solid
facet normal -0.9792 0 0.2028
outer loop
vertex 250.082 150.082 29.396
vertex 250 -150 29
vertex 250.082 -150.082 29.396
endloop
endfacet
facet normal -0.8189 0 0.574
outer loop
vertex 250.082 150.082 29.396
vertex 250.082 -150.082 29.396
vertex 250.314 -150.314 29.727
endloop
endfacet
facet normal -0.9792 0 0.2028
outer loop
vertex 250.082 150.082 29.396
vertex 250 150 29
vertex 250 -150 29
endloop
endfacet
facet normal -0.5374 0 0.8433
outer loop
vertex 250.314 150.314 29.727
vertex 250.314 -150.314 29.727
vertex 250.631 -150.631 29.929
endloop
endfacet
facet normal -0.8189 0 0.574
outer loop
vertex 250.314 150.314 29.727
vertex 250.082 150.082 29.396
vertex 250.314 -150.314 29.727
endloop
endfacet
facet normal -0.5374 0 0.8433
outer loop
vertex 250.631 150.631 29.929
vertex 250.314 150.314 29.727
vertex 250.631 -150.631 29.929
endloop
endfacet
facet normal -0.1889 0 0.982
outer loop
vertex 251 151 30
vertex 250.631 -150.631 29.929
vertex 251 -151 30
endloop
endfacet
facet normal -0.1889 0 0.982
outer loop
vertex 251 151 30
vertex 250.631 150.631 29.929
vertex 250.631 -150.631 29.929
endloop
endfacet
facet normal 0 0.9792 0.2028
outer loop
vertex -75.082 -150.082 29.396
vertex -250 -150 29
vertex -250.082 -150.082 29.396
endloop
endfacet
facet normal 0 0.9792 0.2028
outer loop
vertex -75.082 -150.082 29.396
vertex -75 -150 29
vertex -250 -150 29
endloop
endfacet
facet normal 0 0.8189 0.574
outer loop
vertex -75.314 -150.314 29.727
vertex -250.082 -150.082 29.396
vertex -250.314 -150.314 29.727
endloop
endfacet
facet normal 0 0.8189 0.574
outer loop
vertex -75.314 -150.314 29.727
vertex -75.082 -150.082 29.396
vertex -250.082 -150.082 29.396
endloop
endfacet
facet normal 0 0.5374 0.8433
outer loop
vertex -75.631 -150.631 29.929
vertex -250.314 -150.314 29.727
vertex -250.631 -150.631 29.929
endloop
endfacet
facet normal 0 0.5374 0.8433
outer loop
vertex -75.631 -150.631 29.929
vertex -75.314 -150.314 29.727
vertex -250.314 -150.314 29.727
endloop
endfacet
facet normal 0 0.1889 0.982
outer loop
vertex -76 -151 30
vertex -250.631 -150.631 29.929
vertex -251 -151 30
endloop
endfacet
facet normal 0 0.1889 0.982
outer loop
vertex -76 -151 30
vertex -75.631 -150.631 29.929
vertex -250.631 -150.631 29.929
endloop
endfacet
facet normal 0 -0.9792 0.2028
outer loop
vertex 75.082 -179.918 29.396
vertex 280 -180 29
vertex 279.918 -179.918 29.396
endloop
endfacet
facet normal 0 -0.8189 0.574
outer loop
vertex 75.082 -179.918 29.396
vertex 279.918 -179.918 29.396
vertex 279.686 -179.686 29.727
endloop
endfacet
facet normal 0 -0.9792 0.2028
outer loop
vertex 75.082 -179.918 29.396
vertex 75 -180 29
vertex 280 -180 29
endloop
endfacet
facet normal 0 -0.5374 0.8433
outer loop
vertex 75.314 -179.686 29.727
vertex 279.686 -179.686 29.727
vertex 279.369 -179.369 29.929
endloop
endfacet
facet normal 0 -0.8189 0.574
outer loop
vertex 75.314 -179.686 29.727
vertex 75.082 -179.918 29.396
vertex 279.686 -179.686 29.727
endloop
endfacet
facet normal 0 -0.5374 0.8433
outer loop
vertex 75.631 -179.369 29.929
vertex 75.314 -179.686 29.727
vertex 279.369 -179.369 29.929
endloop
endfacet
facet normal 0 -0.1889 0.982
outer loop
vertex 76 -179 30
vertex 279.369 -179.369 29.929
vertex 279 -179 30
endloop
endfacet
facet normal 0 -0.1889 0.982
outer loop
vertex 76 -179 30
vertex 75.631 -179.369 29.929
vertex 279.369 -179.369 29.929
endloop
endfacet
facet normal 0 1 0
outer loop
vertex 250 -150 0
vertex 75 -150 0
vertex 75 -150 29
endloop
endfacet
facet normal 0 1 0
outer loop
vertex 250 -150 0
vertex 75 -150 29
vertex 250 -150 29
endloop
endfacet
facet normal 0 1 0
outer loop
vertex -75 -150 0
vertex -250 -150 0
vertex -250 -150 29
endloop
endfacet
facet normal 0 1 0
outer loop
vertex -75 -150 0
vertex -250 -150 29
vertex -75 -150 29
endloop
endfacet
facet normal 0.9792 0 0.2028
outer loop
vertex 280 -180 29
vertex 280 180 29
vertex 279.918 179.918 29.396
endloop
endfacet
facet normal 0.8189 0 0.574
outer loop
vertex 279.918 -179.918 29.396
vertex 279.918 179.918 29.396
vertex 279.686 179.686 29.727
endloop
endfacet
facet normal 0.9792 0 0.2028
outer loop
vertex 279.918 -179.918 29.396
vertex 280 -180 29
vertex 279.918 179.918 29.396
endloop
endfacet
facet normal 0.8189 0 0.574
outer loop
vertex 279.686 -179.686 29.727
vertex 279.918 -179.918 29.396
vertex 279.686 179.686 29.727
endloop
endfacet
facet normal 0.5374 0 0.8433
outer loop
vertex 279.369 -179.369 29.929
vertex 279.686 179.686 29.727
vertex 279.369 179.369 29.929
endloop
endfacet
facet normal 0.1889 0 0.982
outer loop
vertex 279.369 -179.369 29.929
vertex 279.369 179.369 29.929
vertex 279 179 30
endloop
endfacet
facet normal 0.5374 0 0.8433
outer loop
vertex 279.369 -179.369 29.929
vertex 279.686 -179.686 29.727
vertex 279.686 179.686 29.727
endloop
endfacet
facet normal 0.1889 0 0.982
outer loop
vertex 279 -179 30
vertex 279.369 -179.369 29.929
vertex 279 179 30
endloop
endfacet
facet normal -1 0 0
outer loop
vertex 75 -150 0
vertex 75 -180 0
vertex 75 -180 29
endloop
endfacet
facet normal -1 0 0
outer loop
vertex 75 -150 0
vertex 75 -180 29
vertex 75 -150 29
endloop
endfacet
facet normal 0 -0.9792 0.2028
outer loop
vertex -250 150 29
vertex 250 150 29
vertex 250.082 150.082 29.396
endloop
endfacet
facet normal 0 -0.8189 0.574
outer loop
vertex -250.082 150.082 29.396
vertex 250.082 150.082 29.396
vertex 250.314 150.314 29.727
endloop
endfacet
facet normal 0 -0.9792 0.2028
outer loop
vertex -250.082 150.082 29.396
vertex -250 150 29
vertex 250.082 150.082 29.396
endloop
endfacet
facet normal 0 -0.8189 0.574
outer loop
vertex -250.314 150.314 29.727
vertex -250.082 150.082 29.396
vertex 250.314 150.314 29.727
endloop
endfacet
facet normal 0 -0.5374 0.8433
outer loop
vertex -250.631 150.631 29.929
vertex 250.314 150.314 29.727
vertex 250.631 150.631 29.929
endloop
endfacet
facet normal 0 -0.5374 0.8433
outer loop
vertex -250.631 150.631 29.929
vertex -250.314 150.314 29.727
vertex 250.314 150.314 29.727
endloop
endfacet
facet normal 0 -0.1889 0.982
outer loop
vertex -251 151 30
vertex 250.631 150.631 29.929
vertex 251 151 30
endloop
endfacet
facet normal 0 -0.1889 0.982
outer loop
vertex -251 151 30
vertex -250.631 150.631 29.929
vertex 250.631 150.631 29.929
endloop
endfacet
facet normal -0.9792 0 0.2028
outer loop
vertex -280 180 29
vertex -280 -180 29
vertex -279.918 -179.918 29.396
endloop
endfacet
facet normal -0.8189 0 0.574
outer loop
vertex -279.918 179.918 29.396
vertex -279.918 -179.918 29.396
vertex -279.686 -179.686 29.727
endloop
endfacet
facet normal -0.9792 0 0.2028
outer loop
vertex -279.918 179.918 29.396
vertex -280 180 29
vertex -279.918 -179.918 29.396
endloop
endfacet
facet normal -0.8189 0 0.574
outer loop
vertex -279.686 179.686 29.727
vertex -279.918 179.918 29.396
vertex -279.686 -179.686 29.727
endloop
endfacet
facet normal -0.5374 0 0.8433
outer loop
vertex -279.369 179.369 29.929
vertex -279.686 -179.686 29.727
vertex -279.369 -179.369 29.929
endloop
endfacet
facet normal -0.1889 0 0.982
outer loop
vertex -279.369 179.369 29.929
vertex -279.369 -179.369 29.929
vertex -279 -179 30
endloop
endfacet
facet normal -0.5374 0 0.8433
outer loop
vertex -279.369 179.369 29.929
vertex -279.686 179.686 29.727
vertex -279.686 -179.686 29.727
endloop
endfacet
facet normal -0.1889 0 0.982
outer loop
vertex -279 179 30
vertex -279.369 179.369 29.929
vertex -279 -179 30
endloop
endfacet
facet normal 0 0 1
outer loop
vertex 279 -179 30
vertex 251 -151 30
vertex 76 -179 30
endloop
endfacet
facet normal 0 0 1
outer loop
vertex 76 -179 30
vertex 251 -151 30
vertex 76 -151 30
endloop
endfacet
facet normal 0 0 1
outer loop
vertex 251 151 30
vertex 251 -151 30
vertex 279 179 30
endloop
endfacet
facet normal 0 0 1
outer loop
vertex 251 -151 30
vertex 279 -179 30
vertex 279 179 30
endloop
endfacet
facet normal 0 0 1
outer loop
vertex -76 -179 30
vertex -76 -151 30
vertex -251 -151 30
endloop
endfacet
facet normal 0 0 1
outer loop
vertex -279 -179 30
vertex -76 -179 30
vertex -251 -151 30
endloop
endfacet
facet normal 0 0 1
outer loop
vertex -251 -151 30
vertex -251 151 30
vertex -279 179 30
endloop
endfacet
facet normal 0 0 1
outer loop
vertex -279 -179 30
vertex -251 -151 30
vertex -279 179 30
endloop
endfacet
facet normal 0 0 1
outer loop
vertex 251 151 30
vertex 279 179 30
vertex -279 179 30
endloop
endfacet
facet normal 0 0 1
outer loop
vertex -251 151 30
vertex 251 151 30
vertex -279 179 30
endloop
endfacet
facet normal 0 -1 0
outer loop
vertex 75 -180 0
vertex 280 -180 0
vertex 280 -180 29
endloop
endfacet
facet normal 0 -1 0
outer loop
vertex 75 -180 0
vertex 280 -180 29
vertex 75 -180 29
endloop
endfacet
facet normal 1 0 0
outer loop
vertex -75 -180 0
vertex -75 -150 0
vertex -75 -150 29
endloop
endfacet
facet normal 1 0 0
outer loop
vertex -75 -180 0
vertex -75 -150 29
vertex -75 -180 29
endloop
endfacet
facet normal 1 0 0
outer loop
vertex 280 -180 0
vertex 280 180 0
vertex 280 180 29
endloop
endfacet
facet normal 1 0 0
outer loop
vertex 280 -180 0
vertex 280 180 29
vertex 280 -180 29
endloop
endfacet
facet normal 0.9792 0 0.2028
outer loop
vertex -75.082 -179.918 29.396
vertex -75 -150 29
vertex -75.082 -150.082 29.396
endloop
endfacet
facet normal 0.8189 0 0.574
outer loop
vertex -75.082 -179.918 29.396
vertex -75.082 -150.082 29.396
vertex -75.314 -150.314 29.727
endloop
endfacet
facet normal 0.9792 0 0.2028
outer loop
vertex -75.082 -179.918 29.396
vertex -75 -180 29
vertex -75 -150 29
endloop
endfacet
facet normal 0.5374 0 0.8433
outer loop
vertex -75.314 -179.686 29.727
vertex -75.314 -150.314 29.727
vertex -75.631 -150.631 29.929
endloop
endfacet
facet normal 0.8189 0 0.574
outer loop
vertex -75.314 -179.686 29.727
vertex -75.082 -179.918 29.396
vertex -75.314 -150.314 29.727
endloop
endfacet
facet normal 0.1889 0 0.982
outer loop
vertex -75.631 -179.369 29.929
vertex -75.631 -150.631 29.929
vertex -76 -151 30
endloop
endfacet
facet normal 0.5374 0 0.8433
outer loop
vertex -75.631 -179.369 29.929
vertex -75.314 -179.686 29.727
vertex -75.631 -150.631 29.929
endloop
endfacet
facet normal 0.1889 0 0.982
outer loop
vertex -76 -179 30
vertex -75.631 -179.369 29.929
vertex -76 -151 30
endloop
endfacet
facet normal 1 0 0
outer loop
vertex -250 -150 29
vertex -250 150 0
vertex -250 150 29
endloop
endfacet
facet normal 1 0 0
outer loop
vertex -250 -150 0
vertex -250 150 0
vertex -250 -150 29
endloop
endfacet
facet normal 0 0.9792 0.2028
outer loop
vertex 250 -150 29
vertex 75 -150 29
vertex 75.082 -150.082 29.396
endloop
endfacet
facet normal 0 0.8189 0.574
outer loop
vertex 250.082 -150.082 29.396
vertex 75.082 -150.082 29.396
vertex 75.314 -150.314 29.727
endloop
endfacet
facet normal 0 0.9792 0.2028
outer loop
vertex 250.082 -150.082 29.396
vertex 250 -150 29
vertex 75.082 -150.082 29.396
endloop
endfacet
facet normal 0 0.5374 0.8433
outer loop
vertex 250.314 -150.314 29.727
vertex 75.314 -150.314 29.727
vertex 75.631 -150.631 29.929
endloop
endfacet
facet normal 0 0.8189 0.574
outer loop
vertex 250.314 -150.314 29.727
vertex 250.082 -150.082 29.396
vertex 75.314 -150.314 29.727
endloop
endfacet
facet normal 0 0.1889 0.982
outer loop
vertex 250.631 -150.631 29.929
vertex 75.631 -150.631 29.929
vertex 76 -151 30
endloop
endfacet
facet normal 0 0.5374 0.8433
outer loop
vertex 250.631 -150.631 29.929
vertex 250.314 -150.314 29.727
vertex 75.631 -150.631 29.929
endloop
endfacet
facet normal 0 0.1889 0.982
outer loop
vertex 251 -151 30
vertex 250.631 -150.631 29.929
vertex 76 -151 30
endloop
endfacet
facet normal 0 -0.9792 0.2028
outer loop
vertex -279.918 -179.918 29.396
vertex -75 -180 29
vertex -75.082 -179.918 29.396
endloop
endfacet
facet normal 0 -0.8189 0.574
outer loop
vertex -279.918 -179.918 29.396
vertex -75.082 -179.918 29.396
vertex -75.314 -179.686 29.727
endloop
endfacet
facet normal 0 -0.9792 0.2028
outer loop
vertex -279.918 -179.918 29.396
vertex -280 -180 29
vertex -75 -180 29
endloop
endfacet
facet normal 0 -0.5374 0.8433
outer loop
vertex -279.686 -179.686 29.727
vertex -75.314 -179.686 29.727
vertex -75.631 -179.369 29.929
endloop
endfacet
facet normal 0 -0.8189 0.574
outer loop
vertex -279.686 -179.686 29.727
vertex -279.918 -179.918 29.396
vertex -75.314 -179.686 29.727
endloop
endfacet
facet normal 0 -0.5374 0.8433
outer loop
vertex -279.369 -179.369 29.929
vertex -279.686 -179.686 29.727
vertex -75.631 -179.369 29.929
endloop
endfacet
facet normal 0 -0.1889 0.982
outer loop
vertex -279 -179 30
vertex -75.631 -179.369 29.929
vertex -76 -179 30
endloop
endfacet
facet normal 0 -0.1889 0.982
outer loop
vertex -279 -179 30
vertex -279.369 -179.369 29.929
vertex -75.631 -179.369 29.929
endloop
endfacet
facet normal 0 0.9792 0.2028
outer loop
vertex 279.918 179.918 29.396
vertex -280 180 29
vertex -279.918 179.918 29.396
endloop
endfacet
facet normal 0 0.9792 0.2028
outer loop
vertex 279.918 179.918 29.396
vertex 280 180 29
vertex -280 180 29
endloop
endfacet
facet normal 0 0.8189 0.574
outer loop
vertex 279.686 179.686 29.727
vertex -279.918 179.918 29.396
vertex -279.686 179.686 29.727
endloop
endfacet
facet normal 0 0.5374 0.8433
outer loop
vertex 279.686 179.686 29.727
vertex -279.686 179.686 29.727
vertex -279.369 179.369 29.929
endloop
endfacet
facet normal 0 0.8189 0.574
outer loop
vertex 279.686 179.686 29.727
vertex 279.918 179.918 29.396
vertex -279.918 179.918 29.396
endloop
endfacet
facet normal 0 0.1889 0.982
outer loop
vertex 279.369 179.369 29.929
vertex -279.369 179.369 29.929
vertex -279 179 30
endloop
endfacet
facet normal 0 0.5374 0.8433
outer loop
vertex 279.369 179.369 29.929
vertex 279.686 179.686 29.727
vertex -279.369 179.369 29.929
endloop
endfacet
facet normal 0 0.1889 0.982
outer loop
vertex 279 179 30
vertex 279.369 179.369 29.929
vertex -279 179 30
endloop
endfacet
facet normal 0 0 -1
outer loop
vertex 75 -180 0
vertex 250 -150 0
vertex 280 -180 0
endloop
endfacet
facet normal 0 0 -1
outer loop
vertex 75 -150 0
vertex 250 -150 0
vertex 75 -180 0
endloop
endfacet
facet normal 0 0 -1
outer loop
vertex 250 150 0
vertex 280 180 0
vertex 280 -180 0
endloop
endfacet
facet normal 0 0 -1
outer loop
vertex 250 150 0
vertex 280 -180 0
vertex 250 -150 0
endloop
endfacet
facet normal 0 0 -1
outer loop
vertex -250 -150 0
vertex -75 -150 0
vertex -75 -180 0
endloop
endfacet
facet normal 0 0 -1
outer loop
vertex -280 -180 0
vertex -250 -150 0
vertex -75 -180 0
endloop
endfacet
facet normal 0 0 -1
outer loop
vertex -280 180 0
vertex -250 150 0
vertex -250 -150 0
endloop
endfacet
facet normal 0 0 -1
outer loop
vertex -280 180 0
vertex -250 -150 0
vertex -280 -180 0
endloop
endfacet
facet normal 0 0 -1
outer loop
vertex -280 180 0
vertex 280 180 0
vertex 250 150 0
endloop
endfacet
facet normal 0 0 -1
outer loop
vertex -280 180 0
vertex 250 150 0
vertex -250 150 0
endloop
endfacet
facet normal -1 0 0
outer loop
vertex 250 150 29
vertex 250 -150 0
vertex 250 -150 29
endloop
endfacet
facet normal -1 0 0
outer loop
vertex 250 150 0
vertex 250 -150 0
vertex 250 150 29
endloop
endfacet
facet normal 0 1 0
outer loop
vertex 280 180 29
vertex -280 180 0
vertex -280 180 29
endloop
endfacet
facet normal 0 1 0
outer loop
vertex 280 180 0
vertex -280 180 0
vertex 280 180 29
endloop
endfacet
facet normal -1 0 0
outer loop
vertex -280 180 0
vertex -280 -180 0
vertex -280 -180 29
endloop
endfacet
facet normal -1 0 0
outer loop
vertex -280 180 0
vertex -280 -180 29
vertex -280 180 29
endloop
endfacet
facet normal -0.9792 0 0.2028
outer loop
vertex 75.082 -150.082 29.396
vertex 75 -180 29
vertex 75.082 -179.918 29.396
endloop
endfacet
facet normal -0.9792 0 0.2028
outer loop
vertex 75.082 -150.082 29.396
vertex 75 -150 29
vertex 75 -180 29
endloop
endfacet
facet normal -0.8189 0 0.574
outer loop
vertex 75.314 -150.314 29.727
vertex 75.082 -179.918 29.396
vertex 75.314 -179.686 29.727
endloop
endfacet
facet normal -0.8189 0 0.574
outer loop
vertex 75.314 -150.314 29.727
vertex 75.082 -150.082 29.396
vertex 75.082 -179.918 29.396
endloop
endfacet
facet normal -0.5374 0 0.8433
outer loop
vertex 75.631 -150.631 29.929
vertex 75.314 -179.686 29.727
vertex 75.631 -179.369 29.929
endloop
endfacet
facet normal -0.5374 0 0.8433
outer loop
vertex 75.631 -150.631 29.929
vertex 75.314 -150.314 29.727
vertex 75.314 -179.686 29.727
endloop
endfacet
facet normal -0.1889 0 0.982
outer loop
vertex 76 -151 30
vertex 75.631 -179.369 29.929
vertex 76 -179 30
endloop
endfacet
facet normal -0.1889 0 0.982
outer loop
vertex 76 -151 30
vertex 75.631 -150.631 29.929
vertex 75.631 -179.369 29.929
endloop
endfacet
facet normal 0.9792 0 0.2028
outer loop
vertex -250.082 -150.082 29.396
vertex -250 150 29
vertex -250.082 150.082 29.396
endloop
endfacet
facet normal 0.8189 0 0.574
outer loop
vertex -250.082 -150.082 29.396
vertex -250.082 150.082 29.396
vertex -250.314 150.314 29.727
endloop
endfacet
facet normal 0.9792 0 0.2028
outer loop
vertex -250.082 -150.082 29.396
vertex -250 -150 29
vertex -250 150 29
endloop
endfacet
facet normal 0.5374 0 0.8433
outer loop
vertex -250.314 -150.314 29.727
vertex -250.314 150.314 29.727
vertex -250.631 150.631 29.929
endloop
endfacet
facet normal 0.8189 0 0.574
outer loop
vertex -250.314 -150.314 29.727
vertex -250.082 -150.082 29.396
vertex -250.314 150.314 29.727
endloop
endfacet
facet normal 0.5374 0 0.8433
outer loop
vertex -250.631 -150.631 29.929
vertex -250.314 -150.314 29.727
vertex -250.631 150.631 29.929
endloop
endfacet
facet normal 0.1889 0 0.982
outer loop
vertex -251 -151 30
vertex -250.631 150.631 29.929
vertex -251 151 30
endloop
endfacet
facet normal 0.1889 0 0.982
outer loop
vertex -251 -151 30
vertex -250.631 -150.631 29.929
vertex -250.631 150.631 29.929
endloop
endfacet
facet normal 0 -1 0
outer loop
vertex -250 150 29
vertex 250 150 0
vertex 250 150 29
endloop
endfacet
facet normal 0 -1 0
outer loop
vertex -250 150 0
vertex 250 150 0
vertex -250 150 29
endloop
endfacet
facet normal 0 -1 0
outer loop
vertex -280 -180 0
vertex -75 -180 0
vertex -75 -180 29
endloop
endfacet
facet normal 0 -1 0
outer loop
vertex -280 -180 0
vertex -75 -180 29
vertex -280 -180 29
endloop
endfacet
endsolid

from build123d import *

# Parameters (mm, degrees)
SALIENTE_EXTRUIR1_DEPTH = 30
REDONDEO1_R             = 1


with BuildPart() as part:
    # Croquis1 → Saliente-Extruir1 (new body)
    with BuildSketch(Plane.XY):
        Polygon((-280, 180), (280, 180), (280, -180), (75, -180), (75, -150), (250, -150), (250, 150), (-250, 150), (-250, -150), (-75, -150), (-75, -180), (-280, -180), align=None)
    extrude(amount=SALIENTE_EXTRUIR1_DEPTH)

    # Redondeo1
    redondeo1_edges = [part.edges().sort_by_distance(p)[0] for p in [
        (177.5, -180, 30),
        (280, 0, 30),
        (0, 180, 30),
        (-280, 0, 30),
        (-177.5, -180, 30),
        (-75, -165, 30),
        (-162.5, -150, 30),
        (-250, 0, 30),
        (0, 150, 30),
        (250, 0, 30),
        (162.5, -150, 30),
        (75, -165, 30),
    ]]
    fillet(redondeo1_edges, radius=REDONDEO1_R)


solid = part.part
